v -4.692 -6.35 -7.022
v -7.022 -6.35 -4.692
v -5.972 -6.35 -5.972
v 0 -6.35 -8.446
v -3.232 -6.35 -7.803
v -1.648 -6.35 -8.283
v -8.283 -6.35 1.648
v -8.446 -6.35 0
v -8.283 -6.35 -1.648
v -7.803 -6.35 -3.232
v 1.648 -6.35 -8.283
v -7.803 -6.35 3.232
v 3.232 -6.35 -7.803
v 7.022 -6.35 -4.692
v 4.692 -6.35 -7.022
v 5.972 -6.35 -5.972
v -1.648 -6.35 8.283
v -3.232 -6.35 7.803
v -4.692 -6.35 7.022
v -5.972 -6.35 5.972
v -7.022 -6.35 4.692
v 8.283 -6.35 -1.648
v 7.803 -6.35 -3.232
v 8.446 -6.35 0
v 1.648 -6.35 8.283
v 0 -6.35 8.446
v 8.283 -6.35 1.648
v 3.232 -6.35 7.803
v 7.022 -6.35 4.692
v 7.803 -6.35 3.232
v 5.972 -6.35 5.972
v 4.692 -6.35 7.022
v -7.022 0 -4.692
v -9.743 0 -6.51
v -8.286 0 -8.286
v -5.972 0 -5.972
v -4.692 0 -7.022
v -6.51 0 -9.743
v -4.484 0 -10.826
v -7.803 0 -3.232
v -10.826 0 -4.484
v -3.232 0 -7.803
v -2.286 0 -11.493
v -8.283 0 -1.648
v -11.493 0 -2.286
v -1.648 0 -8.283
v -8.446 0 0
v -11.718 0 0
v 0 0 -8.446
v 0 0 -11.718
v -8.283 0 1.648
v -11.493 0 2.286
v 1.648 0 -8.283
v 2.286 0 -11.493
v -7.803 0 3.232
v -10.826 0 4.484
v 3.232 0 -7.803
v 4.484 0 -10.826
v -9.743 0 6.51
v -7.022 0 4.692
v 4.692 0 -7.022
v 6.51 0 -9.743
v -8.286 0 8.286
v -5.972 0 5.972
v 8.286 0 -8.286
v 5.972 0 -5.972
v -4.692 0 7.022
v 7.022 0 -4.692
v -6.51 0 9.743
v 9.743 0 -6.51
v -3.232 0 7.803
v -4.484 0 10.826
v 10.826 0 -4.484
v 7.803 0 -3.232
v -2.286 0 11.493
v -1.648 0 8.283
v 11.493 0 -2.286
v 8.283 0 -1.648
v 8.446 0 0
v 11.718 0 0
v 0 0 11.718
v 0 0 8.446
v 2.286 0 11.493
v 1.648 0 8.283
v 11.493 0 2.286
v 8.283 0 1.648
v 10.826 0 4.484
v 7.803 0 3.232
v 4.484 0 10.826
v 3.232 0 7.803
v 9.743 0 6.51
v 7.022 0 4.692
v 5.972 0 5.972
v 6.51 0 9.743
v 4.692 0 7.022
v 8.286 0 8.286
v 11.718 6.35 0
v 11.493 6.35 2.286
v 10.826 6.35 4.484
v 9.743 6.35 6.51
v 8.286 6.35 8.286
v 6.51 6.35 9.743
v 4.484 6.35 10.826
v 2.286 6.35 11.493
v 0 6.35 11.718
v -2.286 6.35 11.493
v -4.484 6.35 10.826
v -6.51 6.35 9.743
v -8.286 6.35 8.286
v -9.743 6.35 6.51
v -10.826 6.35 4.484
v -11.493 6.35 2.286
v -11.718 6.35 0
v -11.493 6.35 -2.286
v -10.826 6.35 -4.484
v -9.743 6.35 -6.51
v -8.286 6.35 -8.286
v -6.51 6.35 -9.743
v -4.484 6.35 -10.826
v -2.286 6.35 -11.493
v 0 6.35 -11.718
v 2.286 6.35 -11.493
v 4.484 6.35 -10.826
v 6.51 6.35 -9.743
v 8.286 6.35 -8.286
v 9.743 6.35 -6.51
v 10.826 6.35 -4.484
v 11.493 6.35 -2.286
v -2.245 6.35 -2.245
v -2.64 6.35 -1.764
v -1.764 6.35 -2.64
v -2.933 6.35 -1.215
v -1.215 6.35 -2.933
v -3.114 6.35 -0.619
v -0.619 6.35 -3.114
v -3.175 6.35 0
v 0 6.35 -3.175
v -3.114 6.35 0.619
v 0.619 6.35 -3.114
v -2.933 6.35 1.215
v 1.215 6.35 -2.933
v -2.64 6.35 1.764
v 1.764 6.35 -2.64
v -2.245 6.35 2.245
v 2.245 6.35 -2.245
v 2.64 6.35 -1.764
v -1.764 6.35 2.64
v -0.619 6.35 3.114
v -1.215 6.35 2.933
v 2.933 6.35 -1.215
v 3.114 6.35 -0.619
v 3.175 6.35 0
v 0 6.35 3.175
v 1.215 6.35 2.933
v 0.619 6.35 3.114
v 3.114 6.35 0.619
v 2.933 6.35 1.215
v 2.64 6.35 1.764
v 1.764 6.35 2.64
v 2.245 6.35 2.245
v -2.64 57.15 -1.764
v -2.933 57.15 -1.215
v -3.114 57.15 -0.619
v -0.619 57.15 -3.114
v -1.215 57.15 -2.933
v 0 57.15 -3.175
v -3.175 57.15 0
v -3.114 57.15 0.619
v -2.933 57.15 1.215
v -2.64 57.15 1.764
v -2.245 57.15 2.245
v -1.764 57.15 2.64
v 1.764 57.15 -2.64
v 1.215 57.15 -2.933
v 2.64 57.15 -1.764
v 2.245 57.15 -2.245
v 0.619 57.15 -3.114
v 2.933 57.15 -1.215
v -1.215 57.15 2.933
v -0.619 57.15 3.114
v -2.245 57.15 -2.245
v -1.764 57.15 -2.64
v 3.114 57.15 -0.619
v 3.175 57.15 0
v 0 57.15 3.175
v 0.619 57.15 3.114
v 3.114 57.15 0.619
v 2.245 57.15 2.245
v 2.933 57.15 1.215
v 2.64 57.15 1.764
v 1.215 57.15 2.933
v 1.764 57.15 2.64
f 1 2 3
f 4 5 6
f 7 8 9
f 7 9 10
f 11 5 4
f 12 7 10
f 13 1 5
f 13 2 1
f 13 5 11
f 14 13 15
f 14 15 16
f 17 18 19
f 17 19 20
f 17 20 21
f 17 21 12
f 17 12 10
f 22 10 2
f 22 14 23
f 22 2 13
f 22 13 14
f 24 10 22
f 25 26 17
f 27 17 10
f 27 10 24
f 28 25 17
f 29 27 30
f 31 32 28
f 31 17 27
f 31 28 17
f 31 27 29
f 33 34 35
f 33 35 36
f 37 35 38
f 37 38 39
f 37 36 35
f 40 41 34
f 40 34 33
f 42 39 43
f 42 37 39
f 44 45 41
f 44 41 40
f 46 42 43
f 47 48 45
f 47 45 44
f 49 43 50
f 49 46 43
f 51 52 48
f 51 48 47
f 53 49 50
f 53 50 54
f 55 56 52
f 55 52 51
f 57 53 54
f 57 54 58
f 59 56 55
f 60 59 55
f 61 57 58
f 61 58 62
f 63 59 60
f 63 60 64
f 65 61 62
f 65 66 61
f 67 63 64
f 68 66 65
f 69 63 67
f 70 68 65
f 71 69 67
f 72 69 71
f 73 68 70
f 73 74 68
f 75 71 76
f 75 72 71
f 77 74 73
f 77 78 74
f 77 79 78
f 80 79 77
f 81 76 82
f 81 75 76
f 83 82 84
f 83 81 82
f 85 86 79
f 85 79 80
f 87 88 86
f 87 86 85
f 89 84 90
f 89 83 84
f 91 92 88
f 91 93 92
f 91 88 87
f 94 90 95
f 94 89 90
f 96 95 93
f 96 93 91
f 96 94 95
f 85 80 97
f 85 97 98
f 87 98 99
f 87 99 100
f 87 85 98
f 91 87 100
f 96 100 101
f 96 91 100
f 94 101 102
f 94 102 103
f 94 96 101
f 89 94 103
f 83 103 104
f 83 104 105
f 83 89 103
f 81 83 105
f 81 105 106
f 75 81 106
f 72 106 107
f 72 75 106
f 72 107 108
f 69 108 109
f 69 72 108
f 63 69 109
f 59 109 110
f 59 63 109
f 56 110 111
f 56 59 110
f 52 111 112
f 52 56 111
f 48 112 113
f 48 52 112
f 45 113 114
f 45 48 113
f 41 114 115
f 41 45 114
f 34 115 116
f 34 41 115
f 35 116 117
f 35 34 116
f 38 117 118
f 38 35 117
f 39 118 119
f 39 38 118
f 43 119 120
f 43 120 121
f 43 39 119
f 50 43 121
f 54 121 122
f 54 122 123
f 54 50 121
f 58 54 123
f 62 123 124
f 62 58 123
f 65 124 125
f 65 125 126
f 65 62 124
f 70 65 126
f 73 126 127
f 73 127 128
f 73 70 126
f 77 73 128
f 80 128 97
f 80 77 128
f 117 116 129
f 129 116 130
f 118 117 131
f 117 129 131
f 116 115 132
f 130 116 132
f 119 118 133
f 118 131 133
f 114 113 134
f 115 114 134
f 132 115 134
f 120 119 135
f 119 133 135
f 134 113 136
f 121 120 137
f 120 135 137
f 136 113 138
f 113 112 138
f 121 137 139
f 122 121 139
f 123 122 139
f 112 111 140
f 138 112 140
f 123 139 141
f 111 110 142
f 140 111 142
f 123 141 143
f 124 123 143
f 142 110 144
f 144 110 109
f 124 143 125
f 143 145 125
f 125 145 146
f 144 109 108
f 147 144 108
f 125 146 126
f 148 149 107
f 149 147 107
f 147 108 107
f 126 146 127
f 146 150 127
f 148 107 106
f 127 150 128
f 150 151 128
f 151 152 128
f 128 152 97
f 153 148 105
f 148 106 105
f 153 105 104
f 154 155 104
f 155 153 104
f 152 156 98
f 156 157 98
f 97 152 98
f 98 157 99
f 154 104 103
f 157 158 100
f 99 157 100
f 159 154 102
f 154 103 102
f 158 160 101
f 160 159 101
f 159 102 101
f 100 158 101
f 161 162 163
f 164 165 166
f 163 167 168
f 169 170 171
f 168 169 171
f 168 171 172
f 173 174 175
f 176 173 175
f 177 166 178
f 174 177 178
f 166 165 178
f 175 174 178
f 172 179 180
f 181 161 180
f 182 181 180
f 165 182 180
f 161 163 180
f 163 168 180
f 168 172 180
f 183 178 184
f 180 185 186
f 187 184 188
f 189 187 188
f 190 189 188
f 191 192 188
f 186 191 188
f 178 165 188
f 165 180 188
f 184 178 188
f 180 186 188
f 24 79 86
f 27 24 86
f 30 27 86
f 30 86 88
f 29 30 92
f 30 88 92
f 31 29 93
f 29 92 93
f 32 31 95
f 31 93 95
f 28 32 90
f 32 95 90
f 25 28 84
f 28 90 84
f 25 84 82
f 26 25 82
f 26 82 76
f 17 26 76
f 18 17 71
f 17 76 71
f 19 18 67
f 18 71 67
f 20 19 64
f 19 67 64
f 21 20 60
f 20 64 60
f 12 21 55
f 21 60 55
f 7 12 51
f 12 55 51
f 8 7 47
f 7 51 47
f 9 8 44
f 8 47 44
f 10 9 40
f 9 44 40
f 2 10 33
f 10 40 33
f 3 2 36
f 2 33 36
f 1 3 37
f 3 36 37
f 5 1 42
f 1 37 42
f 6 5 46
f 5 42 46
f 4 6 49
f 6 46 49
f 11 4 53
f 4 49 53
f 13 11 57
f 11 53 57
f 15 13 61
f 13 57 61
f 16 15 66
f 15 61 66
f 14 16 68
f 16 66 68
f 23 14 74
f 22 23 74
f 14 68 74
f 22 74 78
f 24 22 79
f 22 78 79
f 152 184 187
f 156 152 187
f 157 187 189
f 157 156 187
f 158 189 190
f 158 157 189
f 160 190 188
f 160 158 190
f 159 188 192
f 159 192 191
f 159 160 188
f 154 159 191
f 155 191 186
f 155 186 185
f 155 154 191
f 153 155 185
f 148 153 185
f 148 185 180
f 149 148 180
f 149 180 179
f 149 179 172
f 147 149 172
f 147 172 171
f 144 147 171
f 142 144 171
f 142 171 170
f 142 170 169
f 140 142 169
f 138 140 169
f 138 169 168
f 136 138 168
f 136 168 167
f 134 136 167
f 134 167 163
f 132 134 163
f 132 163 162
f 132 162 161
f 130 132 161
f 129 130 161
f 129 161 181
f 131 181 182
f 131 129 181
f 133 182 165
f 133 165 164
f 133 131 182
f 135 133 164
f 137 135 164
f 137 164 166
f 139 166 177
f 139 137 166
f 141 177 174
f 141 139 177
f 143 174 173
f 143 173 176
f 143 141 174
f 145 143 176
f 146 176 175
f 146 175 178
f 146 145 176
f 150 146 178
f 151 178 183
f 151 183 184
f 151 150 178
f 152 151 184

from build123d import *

# Parameters (mm, degrees)
F0_R     = 8.4455
F1_DEPTH = 6.35
F2_R     = 11.718365
F3_DEPTH = 6.35
F4_R     = 3.175
F5_DEPTH = 57.15


with BuildPart() as f1:
    # F0 (on Front) → F1 (new body)
    with BuildSketch(Plane.XZ):
        Circle(F0_R)
    extrude(amount=F1_DEPTH)

    # F2 (on Front) → F3 (join)
    with BuildSketch(Plane.XZ):
        Circle(F2_R)
    extrude(amount=-F3_DEPTH)

    # F4 (on Front) → F5 (join)
    with BuildSketch(Plane.XZ):
        Circle(F4_R)
    extrude(amount=-F5_DEPTH)


solid = f1.part
